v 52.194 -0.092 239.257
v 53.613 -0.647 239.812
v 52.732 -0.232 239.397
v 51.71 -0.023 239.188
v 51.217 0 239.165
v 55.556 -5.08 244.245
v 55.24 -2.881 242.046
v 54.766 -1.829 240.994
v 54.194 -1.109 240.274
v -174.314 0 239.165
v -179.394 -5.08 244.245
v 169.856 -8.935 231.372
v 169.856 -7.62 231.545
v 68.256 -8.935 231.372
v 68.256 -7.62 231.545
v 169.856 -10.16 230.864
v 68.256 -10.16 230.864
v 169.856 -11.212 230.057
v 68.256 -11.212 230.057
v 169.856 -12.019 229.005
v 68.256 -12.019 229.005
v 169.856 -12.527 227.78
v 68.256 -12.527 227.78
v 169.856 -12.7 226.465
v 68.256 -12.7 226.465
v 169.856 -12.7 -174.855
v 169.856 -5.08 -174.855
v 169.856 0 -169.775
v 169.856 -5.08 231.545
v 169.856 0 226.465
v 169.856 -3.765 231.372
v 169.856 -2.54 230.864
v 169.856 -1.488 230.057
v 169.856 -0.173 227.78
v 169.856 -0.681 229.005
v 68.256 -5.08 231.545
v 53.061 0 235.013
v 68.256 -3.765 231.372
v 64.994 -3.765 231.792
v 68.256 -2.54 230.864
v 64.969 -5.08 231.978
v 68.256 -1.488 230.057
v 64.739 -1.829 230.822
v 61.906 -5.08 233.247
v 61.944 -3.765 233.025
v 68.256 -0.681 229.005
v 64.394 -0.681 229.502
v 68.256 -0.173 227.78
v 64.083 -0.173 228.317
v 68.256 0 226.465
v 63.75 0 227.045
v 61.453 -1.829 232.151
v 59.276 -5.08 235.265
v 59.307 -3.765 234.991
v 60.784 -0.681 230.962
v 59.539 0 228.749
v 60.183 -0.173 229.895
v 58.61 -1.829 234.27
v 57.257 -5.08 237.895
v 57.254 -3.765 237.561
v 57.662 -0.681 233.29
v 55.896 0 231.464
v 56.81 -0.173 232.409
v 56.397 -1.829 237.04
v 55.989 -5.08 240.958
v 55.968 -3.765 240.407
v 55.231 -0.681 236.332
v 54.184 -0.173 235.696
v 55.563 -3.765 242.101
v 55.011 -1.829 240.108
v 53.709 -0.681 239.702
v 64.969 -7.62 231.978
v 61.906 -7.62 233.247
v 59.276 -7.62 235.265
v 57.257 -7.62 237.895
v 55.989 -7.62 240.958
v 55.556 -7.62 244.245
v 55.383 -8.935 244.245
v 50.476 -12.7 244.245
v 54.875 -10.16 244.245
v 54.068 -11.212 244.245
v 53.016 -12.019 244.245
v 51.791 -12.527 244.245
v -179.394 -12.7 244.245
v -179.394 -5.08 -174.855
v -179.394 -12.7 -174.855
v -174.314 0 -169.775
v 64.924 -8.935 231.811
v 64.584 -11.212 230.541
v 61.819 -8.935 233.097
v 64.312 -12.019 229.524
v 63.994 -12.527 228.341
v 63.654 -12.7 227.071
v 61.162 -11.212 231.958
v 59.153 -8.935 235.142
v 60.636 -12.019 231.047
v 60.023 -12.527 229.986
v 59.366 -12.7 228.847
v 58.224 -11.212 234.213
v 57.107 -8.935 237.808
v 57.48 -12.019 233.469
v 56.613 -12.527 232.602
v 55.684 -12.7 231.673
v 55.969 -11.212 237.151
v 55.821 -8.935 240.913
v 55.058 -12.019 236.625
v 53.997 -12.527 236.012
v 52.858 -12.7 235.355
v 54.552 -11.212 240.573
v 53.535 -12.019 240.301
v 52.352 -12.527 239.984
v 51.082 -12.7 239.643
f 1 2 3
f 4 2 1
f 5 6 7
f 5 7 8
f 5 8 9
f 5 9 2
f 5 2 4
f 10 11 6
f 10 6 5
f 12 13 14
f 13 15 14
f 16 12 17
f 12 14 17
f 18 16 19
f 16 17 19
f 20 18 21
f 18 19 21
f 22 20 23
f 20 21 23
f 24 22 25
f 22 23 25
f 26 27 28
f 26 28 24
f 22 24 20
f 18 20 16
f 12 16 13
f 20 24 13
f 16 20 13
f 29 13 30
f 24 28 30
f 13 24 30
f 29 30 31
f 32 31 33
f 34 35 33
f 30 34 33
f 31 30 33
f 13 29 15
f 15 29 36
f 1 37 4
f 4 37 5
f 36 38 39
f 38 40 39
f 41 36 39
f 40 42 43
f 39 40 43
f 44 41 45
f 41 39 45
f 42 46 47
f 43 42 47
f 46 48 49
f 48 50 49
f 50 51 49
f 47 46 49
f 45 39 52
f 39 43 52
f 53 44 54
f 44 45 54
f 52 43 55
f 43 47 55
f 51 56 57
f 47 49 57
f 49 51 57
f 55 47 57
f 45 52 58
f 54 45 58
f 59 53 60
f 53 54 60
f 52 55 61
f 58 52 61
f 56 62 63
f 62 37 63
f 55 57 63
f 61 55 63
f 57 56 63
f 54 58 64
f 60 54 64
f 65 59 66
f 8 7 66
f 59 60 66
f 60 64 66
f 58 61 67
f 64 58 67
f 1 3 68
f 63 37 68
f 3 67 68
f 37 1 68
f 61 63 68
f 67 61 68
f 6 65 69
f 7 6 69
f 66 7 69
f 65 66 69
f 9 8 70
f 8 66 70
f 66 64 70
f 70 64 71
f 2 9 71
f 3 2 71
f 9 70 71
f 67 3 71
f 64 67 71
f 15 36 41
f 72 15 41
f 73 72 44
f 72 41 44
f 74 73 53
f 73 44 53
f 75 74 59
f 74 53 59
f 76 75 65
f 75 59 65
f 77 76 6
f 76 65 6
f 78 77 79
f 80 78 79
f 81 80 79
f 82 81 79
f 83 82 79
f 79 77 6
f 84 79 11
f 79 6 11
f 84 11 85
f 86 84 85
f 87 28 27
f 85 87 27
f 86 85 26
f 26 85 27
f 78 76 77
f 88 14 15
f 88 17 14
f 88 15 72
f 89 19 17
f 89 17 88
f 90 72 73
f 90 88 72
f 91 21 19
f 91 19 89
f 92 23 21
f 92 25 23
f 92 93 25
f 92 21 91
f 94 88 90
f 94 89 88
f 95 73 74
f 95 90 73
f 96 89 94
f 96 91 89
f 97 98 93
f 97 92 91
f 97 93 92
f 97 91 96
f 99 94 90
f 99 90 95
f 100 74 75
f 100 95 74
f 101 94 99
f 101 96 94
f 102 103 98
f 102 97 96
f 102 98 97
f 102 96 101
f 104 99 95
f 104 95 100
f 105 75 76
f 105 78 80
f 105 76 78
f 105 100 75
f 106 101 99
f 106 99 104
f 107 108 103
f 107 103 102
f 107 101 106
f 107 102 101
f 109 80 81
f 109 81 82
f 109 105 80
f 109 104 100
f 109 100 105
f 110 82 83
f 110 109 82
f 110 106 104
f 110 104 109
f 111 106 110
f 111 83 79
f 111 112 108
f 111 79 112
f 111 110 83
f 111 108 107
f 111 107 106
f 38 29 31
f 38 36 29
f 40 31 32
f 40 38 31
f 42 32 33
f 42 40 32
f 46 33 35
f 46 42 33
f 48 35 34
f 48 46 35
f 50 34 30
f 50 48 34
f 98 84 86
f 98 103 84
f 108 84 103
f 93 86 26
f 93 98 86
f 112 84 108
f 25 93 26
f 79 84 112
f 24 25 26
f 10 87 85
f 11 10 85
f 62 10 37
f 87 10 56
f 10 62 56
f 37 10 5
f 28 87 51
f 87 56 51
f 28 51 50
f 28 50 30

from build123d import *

# Parameters (mm, degrees)
F1_DEPTH    = 12.7
F2_R        = 5.08
F3_T1_DEPTH = 255.9982991577
F3_T3_DEPTH = 445.2282991577
F3_T5_DEPTH = 375.3782991577


# Not quite as in the source:
# - a fillet or chamfer that OpenCascade refuses, or shapes differently, is made with other operations: its cross-section is extruded or revolved along the edge and cut away or added


with BuildPart() as f1:
    # F0 (on Front) → F1 (new body)
    with BuildSketch(Plane.XZ):
        with BuildLine():
            Line((55.5559131622, 244.2450298561), (-179.3940868378, 244.2450298561))
            Line((-179.3940868378, 244.2450298561), (-179.3940868378, -174.8549701439))
            Line((-179.3940868378, -174.8549701439), (169.8559131622, -174.8549701439))
            Line((169.8559131622, -174.8549701439), (169.8559131622, 231.5450298561))
            Line((169.8559131622, 231.5450298561), (68.2559131622, 231.5450298561))
            ThreePointArc((68.2559131622, 231.5450298561), (59.2756570412, 235.264773735), (55.5559131622, 244.2450298561))
        make_face()
    extrude(amount=F1_DEPTH)

    # F2
    f2_edges = [f1.edges().sort_by_distance(p)[0] for p in [
        (119.055913, 0, 231.54503),
        (119.055913, -12.7, 231.54503),
        (59.275657, 0, 235.264774),
        (59.275657, -12.7, 235.264774),
    ]]
    fillet(f2_edges, radius=F2_R)

    # F3: chamfer of 5.08 on 3 edges, made by hand

    # F3_s2 → F3_t1 (cut)
    with BuildSketch(Plane.YZ.offset(-192.4582364166)):
        Polygon((-5.08, 244.2450298561), (0, 239.1650298561), (0, 244.2450298561), align=None)
    extrude(amount=F3_T1_DEPTH, mode=Mode.SUBTRACT)

    # F3_s4 → F3_t3 (cut)
    with BuildSketch(Plane.XY.offset(-187.9191197228)):
        Polygon((-174.3140868378, 0), (-179.3940868378, -5.08), (-179.3940868378, 0), align=None)
    extrude(amount=F3_T3_DEPTH, mode=Mode.SUBTRACT)

    # F3_s6 → F3_t5 (cut)
    with BuildSketch(Plane.YZ.offset(-192.4582364166)):
        Polygon((0, -169.7749701439), (-5.08, -174.8549701439), (0, -174.8549701439), align=None)
    extrude(amount=F3_T5_DEPTH, mode=Mode.SUBTRACT)


solid = f1.part
